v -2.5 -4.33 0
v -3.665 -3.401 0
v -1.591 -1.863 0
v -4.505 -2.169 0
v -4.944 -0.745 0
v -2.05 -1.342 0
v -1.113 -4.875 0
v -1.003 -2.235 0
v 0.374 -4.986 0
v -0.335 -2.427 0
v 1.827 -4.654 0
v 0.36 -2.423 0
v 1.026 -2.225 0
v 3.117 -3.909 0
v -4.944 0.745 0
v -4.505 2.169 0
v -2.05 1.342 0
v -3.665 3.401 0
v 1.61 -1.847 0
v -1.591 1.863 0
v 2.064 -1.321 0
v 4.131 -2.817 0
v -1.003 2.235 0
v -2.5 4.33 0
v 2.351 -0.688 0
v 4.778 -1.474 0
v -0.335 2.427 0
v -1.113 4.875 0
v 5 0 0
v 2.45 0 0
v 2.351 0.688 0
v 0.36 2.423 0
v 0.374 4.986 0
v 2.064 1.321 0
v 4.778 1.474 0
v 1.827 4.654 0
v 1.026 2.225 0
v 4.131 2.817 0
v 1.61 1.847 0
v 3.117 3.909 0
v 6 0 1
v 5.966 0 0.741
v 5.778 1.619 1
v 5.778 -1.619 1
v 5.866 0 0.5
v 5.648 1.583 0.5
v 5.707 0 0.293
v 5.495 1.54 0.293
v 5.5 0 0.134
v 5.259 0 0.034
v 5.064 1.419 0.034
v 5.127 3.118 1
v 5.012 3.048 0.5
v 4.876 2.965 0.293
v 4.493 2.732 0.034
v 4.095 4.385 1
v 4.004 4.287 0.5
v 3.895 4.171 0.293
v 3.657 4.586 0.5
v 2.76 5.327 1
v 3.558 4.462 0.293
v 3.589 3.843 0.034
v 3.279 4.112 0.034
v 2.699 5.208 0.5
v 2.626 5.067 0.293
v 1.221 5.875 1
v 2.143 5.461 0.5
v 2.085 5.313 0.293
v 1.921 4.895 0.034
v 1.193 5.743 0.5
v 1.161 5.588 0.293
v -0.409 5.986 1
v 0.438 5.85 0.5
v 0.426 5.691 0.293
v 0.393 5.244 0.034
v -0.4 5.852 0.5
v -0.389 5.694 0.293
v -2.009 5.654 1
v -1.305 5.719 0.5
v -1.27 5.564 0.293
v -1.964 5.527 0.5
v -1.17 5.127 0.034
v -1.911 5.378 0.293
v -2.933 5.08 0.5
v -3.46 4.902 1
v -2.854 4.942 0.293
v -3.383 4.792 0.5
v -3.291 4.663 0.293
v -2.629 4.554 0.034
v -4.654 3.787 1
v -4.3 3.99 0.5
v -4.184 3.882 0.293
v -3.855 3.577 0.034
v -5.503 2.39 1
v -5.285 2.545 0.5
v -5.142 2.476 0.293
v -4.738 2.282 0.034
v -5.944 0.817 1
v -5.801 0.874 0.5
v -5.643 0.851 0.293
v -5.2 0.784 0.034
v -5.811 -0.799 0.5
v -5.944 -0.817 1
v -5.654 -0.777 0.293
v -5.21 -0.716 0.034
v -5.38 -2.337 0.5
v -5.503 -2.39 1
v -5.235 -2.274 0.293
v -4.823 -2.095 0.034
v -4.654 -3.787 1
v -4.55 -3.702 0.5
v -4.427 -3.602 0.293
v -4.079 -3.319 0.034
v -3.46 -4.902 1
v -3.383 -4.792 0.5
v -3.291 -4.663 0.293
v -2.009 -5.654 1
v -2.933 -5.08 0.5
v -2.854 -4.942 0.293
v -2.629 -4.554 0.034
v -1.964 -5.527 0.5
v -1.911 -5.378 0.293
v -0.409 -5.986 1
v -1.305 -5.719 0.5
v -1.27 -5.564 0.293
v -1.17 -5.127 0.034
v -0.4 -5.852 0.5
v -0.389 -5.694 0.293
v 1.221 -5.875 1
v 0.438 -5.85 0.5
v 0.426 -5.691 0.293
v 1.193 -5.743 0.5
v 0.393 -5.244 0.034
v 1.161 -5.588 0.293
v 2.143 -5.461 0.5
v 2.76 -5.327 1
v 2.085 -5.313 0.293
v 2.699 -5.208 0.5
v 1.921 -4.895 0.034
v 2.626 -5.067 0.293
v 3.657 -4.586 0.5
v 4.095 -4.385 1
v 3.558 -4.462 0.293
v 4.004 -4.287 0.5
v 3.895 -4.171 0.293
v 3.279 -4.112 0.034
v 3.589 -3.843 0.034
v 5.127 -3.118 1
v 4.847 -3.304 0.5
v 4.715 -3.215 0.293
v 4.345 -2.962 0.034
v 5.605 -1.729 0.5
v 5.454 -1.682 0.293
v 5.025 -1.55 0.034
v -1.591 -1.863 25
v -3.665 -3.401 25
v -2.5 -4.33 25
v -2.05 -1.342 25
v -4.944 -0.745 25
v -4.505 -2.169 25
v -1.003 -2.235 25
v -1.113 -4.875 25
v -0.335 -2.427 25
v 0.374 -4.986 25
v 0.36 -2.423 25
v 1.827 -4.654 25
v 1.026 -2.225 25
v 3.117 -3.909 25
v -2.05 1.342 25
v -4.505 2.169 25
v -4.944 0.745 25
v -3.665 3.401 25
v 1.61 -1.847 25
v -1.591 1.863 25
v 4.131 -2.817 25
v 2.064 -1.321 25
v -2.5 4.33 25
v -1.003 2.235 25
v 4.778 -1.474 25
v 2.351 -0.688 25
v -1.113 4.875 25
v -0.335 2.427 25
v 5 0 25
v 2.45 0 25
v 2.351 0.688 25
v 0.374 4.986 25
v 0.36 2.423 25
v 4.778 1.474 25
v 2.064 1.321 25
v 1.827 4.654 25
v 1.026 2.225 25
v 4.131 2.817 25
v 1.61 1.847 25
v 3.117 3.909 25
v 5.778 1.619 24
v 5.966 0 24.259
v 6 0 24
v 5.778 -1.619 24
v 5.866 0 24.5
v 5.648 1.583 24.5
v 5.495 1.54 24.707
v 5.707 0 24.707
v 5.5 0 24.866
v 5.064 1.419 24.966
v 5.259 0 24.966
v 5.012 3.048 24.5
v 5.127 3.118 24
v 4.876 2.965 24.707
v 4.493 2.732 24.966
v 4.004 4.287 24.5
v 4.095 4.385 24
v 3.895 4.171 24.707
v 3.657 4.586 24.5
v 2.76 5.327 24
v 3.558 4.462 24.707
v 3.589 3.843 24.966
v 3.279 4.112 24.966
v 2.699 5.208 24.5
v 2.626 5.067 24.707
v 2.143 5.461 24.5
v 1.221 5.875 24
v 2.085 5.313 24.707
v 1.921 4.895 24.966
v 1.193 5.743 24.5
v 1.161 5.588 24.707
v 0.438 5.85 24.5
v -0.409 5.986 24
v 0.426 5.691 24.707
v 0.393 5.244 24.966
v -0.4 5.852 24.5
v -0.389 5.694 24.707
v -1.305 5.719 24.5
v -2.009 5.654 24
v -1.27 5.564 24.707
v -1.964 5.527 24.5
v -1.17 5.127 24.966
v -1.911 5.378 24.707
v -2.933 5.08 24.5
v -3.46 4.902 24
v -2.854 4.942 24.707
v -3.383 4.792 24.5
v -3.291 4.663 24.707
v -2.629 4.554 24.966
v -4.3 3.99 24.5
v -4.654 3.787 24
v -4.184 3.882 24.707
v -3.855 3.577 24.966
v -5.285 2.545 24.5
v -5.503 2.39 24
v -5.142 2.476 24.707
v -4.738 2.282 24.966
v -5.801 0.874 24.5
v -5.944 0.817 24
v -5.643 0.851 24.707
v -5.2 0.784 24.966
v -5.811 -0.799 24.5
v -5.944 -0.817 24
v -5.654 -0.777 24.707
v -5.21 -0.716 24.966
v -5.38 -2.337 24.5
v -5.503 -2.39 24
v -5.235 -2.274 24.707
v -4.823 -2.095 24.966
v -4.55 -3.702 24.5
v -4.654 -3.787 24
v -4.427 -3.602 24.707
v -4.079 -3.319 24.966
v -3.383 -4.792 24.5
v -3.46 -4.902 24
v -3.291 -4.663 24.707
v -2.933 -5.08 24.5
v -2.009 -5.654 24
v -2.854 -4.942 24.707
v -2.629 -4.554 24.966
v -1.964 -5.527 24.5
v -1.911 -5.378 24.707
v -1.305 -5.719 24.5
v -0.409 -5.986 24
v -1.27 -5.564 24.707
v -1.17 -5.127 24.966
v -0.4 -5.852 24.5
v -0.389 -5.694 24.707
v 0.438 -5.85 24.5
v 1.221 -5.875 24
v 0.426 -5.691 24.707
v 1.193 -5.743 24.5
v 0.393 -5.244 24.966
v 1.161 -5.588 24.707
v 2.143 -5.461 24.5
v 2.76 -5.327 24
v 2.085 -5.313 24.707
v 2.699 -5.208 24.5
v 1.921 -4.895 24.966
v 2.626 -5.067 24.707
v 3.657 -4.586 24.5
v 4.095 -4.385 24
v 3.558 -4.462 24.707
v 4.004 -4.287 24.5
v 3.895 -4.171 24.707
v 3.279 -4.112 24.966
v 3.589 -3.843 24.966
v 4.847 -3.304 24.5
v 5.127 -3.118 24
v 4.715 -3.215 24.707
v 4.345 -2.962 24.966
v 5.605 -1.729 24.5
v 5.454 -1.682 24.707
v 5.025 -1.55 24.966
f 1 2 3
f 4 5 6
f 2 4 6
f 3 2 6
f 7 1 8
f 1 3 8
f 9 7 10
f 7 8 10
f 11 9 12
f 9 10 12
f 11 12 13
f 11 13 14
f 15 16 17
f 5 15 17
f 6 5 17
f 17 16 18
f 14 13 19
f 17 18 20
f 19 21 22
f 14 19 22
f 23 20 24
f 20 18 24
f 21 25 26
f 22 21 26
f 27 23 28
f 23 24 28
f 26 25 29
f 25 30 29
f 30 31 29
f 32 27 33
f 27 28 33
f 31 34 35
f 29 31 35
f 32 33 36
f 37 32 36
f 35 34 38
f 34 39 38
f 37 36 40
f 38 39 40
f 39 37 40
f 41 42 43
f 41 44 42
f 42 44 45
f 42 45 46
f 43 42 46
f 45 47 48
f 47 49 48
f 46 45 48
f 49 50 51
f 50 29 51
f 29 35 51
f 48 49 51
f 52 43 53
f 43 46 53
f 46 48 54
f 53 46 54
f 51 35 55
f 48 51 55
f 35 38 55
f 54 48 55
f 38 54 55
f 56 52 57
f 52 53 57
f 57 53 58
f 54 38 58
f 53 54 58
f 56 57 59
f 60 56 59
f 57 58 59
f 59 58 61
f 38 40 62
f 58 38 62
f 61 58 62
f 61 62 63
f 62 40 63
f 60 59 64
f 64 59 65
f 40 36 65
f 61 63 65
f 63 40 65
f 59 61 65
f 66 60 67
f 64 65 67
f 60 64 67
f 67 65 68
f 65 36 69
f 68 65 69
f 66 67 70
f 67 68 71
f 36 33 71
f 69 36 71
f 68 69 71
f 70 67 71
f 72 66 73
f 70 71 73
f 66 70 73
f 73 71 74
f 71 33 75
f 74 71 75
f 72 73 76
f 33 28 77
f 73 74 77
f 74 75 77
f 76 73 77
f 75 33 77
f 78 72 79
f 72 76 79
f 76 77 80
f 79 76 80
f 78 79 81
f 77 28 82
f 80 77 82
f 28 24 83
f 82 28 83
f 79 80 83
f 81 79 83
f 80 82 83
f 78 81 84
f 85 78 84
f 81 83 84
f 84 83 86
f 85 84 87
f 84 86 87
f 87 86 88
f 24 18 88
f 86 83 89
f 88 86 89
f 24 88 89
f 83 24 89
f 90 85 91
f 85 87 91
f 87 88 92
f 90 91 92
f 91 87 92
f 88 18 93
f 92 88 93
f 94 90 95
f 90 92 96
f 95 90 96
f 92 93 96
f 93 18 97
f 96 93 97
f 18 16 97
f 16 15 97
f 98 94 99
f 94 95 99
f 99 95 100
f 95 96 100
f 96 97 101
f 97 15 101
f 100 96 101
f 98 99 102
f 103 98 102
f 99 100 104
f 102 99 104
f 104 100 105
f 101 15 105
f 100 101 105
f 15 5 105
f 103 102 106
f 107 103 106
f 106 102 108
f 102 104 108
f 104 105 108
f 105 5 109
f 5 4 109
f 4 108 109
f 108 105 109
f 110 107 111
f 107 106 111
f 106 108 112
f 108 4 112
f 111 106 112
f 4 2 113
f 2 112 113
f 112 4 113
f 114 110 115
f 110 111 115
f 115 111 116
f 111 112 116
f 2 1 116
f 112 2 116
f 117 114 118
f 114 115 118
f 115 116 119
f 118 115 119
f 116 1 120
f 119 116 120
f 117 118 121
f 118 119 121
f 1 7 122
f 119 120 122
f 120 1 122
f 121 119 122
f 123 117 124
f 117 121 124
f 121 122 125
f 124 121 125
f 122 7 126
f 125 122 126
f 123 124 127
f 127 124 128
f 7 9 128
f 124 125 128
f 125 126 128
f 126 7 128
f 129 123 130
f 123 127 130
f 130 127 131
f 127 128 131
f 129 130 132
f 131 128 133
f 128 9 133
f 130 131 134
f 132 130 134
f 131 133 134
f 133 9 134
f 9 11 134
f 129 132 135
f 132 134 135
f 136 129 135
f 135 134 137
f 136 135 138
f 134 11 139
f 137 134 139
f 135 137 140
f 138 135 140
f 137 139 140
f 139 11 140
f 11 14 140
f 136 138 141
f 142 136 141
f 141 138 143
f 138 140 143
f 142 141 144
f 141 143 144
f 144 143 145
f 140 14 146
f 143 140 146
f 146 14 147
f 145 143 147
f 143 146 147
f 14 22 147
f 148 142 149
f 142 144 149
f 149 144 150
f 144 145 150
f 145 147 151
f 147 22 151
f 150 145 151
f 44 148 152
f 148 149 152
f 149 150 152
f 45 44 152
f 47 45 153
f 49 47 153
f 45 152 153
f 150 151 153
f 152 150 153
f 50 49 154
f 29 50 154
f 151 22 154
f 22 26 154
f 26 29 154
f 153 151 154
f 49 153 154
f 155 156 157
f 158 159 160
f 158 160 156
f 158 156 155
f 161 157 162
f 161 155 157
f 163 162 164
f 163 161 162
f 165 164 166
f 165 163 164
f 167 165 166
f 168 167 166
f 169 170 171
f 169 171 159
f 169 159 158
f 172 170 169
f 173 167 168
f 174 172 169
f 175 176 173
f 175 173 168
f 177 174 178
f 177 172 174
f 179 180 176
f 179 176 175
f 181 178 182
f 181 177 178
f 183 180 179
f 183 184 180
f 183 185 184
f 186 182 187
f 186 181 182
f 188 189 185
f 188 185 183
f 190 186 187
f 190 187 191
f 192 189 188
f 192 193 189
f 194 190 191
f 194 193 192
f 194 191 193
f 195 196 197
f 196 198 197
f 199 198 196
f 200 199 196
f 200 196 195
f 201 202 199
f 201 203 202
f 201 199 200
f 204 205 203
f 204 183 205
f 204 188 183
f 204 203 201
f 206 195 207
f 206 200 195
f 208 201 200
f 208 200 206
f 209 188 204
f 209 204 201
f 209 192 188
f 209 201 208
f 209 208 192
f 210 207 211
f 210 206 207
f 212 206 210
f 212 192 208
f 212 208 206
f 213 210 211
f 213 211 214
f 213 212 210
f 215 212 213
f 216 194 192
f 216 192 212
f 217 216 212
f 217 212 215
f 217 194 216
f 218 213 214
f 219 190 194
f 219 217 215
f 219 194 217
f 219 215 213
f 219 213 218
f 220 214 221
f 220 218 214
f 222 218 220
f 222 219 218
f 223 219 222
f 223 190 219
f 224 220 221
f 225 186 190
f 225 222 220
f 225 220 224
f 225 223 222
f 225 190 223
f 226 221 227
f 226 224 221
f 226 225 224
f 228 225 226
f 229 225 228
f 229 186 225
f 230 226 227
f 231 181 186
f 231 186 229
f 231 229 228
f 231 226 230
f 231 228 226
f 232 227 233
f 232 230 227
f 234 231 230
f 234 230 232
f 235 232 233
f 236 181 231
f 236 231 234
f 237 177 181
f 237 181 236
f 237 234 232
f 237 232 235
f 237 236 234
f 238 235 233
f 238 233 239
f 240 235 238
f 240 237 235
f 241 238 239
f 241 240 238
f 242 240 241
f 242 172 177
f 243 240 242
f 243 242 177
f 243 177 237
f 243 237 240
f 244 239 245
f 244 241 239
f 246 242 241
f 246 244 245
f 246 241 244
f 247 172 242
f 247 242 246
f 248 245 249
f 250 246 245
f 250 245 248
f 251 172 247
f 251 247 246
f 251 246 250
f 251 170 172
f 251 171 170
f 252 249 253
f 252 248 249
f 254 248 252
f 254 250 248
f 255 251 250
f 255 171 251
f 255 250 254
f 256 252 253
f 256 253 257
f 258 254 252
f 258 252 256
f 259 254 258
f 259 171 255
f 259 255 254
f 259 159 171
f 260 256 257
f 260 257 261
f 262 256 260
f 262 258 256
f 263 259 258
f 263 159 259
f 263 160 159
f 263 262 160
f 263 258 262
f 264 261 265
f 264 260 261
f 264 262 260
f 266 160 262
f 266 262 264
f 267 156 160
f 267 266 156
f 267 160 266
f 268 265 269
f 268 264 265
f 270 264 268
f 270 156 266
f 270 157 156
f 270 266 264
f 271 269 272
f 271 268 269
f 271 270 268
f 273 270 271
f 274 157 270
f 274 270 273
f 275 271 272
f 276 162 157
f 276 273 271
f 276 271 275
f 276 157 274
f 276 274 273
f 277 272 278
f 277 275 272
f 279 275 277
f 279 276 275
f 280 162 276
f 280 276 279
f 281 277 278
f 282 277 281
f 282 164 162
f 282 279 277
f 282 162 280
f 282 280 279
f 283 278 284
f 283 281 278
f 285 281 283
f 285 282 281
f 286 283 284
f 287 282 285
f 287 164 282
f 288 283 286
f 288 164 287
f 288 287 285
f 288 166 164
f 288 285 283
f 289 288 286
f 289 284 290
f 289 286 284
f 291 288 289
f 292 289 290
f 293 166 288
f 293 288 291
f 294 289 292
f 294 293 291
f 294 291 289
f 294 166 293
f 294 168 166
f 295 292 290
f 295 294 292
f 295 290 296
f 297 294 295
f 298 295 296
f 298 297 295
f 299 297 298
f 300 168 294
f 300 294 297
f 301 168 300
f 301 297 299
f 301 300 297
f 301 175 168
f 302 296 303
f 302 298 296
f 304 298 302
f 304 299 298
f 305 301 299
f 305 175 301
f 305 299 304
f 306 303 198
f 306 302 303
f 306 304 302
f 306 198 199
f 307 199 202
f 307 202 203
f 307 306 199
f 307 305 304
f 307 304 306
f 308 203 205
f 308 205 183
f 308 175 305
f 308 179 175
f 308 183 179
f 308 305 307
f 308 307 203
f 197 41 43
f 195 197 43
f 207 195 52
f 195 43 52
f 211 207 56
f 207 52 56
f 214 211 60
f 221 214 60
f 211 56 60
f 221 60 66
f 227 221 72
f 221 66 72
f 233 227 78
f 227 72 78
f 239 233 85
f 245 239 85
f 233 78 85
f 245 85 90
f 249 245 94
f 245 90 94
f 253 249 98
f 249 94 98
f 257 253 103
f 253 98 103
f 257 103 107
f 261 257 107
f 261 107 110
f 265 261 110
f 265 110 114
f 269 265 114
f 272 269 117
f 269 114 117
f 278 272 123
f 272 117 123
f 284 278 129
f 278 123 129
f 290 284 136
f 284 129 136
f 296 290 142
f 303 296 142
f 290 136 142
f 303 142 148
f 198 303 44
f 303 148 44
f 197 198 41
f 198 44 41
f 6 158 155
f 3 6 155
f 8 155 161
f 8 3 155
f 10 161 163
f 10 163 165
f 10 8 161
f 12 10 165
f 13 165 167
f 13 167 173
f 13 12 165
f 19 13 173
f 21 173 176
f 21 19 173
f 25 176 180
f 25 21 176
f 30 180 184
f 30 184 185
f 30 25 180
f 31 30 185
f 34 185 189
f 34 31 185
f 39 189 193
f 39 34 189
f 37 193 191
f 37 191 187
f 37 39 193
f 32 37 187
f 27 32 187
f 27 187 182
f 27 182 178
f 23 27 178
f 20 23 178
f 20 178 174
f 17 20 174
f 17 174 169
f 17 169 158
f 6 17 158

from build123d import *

# Parameters (mm, degrees)
F0_R     = 6
F2_DEPTH = 25
F3_DEPTH = 25
F4_R     = 1


with BuildPart() as f2:
    # F0 (on Top) → F2 (new body)
    with BuildSketch(Plane.XY):
        Circle(F0_R)
    extrude(amount=F2_DEPTH)

    # F1 (on Top) → F3 (cut)
    with BuildSketch(Plane.XY):
        with BuildLine():
            Line((-2.05, 1.341641), (-2.05, -1.341641))
            ThreePointArc((-2.05, -1.341641), (2.45, 0), (-2.05, 1.341641))
        make_face()
    extrude(amount=F3_DEPTH, mode=Mode.SUBTRACT)

    # F4
    f4_edges = [f2.edges().sort_by_distance(p)[0] for p in [
        (-6, 0, 25),
        (-6, 0, 0),
    ]]
    fillet(f4_edges, radius=F4_R)


solid = f2.part
